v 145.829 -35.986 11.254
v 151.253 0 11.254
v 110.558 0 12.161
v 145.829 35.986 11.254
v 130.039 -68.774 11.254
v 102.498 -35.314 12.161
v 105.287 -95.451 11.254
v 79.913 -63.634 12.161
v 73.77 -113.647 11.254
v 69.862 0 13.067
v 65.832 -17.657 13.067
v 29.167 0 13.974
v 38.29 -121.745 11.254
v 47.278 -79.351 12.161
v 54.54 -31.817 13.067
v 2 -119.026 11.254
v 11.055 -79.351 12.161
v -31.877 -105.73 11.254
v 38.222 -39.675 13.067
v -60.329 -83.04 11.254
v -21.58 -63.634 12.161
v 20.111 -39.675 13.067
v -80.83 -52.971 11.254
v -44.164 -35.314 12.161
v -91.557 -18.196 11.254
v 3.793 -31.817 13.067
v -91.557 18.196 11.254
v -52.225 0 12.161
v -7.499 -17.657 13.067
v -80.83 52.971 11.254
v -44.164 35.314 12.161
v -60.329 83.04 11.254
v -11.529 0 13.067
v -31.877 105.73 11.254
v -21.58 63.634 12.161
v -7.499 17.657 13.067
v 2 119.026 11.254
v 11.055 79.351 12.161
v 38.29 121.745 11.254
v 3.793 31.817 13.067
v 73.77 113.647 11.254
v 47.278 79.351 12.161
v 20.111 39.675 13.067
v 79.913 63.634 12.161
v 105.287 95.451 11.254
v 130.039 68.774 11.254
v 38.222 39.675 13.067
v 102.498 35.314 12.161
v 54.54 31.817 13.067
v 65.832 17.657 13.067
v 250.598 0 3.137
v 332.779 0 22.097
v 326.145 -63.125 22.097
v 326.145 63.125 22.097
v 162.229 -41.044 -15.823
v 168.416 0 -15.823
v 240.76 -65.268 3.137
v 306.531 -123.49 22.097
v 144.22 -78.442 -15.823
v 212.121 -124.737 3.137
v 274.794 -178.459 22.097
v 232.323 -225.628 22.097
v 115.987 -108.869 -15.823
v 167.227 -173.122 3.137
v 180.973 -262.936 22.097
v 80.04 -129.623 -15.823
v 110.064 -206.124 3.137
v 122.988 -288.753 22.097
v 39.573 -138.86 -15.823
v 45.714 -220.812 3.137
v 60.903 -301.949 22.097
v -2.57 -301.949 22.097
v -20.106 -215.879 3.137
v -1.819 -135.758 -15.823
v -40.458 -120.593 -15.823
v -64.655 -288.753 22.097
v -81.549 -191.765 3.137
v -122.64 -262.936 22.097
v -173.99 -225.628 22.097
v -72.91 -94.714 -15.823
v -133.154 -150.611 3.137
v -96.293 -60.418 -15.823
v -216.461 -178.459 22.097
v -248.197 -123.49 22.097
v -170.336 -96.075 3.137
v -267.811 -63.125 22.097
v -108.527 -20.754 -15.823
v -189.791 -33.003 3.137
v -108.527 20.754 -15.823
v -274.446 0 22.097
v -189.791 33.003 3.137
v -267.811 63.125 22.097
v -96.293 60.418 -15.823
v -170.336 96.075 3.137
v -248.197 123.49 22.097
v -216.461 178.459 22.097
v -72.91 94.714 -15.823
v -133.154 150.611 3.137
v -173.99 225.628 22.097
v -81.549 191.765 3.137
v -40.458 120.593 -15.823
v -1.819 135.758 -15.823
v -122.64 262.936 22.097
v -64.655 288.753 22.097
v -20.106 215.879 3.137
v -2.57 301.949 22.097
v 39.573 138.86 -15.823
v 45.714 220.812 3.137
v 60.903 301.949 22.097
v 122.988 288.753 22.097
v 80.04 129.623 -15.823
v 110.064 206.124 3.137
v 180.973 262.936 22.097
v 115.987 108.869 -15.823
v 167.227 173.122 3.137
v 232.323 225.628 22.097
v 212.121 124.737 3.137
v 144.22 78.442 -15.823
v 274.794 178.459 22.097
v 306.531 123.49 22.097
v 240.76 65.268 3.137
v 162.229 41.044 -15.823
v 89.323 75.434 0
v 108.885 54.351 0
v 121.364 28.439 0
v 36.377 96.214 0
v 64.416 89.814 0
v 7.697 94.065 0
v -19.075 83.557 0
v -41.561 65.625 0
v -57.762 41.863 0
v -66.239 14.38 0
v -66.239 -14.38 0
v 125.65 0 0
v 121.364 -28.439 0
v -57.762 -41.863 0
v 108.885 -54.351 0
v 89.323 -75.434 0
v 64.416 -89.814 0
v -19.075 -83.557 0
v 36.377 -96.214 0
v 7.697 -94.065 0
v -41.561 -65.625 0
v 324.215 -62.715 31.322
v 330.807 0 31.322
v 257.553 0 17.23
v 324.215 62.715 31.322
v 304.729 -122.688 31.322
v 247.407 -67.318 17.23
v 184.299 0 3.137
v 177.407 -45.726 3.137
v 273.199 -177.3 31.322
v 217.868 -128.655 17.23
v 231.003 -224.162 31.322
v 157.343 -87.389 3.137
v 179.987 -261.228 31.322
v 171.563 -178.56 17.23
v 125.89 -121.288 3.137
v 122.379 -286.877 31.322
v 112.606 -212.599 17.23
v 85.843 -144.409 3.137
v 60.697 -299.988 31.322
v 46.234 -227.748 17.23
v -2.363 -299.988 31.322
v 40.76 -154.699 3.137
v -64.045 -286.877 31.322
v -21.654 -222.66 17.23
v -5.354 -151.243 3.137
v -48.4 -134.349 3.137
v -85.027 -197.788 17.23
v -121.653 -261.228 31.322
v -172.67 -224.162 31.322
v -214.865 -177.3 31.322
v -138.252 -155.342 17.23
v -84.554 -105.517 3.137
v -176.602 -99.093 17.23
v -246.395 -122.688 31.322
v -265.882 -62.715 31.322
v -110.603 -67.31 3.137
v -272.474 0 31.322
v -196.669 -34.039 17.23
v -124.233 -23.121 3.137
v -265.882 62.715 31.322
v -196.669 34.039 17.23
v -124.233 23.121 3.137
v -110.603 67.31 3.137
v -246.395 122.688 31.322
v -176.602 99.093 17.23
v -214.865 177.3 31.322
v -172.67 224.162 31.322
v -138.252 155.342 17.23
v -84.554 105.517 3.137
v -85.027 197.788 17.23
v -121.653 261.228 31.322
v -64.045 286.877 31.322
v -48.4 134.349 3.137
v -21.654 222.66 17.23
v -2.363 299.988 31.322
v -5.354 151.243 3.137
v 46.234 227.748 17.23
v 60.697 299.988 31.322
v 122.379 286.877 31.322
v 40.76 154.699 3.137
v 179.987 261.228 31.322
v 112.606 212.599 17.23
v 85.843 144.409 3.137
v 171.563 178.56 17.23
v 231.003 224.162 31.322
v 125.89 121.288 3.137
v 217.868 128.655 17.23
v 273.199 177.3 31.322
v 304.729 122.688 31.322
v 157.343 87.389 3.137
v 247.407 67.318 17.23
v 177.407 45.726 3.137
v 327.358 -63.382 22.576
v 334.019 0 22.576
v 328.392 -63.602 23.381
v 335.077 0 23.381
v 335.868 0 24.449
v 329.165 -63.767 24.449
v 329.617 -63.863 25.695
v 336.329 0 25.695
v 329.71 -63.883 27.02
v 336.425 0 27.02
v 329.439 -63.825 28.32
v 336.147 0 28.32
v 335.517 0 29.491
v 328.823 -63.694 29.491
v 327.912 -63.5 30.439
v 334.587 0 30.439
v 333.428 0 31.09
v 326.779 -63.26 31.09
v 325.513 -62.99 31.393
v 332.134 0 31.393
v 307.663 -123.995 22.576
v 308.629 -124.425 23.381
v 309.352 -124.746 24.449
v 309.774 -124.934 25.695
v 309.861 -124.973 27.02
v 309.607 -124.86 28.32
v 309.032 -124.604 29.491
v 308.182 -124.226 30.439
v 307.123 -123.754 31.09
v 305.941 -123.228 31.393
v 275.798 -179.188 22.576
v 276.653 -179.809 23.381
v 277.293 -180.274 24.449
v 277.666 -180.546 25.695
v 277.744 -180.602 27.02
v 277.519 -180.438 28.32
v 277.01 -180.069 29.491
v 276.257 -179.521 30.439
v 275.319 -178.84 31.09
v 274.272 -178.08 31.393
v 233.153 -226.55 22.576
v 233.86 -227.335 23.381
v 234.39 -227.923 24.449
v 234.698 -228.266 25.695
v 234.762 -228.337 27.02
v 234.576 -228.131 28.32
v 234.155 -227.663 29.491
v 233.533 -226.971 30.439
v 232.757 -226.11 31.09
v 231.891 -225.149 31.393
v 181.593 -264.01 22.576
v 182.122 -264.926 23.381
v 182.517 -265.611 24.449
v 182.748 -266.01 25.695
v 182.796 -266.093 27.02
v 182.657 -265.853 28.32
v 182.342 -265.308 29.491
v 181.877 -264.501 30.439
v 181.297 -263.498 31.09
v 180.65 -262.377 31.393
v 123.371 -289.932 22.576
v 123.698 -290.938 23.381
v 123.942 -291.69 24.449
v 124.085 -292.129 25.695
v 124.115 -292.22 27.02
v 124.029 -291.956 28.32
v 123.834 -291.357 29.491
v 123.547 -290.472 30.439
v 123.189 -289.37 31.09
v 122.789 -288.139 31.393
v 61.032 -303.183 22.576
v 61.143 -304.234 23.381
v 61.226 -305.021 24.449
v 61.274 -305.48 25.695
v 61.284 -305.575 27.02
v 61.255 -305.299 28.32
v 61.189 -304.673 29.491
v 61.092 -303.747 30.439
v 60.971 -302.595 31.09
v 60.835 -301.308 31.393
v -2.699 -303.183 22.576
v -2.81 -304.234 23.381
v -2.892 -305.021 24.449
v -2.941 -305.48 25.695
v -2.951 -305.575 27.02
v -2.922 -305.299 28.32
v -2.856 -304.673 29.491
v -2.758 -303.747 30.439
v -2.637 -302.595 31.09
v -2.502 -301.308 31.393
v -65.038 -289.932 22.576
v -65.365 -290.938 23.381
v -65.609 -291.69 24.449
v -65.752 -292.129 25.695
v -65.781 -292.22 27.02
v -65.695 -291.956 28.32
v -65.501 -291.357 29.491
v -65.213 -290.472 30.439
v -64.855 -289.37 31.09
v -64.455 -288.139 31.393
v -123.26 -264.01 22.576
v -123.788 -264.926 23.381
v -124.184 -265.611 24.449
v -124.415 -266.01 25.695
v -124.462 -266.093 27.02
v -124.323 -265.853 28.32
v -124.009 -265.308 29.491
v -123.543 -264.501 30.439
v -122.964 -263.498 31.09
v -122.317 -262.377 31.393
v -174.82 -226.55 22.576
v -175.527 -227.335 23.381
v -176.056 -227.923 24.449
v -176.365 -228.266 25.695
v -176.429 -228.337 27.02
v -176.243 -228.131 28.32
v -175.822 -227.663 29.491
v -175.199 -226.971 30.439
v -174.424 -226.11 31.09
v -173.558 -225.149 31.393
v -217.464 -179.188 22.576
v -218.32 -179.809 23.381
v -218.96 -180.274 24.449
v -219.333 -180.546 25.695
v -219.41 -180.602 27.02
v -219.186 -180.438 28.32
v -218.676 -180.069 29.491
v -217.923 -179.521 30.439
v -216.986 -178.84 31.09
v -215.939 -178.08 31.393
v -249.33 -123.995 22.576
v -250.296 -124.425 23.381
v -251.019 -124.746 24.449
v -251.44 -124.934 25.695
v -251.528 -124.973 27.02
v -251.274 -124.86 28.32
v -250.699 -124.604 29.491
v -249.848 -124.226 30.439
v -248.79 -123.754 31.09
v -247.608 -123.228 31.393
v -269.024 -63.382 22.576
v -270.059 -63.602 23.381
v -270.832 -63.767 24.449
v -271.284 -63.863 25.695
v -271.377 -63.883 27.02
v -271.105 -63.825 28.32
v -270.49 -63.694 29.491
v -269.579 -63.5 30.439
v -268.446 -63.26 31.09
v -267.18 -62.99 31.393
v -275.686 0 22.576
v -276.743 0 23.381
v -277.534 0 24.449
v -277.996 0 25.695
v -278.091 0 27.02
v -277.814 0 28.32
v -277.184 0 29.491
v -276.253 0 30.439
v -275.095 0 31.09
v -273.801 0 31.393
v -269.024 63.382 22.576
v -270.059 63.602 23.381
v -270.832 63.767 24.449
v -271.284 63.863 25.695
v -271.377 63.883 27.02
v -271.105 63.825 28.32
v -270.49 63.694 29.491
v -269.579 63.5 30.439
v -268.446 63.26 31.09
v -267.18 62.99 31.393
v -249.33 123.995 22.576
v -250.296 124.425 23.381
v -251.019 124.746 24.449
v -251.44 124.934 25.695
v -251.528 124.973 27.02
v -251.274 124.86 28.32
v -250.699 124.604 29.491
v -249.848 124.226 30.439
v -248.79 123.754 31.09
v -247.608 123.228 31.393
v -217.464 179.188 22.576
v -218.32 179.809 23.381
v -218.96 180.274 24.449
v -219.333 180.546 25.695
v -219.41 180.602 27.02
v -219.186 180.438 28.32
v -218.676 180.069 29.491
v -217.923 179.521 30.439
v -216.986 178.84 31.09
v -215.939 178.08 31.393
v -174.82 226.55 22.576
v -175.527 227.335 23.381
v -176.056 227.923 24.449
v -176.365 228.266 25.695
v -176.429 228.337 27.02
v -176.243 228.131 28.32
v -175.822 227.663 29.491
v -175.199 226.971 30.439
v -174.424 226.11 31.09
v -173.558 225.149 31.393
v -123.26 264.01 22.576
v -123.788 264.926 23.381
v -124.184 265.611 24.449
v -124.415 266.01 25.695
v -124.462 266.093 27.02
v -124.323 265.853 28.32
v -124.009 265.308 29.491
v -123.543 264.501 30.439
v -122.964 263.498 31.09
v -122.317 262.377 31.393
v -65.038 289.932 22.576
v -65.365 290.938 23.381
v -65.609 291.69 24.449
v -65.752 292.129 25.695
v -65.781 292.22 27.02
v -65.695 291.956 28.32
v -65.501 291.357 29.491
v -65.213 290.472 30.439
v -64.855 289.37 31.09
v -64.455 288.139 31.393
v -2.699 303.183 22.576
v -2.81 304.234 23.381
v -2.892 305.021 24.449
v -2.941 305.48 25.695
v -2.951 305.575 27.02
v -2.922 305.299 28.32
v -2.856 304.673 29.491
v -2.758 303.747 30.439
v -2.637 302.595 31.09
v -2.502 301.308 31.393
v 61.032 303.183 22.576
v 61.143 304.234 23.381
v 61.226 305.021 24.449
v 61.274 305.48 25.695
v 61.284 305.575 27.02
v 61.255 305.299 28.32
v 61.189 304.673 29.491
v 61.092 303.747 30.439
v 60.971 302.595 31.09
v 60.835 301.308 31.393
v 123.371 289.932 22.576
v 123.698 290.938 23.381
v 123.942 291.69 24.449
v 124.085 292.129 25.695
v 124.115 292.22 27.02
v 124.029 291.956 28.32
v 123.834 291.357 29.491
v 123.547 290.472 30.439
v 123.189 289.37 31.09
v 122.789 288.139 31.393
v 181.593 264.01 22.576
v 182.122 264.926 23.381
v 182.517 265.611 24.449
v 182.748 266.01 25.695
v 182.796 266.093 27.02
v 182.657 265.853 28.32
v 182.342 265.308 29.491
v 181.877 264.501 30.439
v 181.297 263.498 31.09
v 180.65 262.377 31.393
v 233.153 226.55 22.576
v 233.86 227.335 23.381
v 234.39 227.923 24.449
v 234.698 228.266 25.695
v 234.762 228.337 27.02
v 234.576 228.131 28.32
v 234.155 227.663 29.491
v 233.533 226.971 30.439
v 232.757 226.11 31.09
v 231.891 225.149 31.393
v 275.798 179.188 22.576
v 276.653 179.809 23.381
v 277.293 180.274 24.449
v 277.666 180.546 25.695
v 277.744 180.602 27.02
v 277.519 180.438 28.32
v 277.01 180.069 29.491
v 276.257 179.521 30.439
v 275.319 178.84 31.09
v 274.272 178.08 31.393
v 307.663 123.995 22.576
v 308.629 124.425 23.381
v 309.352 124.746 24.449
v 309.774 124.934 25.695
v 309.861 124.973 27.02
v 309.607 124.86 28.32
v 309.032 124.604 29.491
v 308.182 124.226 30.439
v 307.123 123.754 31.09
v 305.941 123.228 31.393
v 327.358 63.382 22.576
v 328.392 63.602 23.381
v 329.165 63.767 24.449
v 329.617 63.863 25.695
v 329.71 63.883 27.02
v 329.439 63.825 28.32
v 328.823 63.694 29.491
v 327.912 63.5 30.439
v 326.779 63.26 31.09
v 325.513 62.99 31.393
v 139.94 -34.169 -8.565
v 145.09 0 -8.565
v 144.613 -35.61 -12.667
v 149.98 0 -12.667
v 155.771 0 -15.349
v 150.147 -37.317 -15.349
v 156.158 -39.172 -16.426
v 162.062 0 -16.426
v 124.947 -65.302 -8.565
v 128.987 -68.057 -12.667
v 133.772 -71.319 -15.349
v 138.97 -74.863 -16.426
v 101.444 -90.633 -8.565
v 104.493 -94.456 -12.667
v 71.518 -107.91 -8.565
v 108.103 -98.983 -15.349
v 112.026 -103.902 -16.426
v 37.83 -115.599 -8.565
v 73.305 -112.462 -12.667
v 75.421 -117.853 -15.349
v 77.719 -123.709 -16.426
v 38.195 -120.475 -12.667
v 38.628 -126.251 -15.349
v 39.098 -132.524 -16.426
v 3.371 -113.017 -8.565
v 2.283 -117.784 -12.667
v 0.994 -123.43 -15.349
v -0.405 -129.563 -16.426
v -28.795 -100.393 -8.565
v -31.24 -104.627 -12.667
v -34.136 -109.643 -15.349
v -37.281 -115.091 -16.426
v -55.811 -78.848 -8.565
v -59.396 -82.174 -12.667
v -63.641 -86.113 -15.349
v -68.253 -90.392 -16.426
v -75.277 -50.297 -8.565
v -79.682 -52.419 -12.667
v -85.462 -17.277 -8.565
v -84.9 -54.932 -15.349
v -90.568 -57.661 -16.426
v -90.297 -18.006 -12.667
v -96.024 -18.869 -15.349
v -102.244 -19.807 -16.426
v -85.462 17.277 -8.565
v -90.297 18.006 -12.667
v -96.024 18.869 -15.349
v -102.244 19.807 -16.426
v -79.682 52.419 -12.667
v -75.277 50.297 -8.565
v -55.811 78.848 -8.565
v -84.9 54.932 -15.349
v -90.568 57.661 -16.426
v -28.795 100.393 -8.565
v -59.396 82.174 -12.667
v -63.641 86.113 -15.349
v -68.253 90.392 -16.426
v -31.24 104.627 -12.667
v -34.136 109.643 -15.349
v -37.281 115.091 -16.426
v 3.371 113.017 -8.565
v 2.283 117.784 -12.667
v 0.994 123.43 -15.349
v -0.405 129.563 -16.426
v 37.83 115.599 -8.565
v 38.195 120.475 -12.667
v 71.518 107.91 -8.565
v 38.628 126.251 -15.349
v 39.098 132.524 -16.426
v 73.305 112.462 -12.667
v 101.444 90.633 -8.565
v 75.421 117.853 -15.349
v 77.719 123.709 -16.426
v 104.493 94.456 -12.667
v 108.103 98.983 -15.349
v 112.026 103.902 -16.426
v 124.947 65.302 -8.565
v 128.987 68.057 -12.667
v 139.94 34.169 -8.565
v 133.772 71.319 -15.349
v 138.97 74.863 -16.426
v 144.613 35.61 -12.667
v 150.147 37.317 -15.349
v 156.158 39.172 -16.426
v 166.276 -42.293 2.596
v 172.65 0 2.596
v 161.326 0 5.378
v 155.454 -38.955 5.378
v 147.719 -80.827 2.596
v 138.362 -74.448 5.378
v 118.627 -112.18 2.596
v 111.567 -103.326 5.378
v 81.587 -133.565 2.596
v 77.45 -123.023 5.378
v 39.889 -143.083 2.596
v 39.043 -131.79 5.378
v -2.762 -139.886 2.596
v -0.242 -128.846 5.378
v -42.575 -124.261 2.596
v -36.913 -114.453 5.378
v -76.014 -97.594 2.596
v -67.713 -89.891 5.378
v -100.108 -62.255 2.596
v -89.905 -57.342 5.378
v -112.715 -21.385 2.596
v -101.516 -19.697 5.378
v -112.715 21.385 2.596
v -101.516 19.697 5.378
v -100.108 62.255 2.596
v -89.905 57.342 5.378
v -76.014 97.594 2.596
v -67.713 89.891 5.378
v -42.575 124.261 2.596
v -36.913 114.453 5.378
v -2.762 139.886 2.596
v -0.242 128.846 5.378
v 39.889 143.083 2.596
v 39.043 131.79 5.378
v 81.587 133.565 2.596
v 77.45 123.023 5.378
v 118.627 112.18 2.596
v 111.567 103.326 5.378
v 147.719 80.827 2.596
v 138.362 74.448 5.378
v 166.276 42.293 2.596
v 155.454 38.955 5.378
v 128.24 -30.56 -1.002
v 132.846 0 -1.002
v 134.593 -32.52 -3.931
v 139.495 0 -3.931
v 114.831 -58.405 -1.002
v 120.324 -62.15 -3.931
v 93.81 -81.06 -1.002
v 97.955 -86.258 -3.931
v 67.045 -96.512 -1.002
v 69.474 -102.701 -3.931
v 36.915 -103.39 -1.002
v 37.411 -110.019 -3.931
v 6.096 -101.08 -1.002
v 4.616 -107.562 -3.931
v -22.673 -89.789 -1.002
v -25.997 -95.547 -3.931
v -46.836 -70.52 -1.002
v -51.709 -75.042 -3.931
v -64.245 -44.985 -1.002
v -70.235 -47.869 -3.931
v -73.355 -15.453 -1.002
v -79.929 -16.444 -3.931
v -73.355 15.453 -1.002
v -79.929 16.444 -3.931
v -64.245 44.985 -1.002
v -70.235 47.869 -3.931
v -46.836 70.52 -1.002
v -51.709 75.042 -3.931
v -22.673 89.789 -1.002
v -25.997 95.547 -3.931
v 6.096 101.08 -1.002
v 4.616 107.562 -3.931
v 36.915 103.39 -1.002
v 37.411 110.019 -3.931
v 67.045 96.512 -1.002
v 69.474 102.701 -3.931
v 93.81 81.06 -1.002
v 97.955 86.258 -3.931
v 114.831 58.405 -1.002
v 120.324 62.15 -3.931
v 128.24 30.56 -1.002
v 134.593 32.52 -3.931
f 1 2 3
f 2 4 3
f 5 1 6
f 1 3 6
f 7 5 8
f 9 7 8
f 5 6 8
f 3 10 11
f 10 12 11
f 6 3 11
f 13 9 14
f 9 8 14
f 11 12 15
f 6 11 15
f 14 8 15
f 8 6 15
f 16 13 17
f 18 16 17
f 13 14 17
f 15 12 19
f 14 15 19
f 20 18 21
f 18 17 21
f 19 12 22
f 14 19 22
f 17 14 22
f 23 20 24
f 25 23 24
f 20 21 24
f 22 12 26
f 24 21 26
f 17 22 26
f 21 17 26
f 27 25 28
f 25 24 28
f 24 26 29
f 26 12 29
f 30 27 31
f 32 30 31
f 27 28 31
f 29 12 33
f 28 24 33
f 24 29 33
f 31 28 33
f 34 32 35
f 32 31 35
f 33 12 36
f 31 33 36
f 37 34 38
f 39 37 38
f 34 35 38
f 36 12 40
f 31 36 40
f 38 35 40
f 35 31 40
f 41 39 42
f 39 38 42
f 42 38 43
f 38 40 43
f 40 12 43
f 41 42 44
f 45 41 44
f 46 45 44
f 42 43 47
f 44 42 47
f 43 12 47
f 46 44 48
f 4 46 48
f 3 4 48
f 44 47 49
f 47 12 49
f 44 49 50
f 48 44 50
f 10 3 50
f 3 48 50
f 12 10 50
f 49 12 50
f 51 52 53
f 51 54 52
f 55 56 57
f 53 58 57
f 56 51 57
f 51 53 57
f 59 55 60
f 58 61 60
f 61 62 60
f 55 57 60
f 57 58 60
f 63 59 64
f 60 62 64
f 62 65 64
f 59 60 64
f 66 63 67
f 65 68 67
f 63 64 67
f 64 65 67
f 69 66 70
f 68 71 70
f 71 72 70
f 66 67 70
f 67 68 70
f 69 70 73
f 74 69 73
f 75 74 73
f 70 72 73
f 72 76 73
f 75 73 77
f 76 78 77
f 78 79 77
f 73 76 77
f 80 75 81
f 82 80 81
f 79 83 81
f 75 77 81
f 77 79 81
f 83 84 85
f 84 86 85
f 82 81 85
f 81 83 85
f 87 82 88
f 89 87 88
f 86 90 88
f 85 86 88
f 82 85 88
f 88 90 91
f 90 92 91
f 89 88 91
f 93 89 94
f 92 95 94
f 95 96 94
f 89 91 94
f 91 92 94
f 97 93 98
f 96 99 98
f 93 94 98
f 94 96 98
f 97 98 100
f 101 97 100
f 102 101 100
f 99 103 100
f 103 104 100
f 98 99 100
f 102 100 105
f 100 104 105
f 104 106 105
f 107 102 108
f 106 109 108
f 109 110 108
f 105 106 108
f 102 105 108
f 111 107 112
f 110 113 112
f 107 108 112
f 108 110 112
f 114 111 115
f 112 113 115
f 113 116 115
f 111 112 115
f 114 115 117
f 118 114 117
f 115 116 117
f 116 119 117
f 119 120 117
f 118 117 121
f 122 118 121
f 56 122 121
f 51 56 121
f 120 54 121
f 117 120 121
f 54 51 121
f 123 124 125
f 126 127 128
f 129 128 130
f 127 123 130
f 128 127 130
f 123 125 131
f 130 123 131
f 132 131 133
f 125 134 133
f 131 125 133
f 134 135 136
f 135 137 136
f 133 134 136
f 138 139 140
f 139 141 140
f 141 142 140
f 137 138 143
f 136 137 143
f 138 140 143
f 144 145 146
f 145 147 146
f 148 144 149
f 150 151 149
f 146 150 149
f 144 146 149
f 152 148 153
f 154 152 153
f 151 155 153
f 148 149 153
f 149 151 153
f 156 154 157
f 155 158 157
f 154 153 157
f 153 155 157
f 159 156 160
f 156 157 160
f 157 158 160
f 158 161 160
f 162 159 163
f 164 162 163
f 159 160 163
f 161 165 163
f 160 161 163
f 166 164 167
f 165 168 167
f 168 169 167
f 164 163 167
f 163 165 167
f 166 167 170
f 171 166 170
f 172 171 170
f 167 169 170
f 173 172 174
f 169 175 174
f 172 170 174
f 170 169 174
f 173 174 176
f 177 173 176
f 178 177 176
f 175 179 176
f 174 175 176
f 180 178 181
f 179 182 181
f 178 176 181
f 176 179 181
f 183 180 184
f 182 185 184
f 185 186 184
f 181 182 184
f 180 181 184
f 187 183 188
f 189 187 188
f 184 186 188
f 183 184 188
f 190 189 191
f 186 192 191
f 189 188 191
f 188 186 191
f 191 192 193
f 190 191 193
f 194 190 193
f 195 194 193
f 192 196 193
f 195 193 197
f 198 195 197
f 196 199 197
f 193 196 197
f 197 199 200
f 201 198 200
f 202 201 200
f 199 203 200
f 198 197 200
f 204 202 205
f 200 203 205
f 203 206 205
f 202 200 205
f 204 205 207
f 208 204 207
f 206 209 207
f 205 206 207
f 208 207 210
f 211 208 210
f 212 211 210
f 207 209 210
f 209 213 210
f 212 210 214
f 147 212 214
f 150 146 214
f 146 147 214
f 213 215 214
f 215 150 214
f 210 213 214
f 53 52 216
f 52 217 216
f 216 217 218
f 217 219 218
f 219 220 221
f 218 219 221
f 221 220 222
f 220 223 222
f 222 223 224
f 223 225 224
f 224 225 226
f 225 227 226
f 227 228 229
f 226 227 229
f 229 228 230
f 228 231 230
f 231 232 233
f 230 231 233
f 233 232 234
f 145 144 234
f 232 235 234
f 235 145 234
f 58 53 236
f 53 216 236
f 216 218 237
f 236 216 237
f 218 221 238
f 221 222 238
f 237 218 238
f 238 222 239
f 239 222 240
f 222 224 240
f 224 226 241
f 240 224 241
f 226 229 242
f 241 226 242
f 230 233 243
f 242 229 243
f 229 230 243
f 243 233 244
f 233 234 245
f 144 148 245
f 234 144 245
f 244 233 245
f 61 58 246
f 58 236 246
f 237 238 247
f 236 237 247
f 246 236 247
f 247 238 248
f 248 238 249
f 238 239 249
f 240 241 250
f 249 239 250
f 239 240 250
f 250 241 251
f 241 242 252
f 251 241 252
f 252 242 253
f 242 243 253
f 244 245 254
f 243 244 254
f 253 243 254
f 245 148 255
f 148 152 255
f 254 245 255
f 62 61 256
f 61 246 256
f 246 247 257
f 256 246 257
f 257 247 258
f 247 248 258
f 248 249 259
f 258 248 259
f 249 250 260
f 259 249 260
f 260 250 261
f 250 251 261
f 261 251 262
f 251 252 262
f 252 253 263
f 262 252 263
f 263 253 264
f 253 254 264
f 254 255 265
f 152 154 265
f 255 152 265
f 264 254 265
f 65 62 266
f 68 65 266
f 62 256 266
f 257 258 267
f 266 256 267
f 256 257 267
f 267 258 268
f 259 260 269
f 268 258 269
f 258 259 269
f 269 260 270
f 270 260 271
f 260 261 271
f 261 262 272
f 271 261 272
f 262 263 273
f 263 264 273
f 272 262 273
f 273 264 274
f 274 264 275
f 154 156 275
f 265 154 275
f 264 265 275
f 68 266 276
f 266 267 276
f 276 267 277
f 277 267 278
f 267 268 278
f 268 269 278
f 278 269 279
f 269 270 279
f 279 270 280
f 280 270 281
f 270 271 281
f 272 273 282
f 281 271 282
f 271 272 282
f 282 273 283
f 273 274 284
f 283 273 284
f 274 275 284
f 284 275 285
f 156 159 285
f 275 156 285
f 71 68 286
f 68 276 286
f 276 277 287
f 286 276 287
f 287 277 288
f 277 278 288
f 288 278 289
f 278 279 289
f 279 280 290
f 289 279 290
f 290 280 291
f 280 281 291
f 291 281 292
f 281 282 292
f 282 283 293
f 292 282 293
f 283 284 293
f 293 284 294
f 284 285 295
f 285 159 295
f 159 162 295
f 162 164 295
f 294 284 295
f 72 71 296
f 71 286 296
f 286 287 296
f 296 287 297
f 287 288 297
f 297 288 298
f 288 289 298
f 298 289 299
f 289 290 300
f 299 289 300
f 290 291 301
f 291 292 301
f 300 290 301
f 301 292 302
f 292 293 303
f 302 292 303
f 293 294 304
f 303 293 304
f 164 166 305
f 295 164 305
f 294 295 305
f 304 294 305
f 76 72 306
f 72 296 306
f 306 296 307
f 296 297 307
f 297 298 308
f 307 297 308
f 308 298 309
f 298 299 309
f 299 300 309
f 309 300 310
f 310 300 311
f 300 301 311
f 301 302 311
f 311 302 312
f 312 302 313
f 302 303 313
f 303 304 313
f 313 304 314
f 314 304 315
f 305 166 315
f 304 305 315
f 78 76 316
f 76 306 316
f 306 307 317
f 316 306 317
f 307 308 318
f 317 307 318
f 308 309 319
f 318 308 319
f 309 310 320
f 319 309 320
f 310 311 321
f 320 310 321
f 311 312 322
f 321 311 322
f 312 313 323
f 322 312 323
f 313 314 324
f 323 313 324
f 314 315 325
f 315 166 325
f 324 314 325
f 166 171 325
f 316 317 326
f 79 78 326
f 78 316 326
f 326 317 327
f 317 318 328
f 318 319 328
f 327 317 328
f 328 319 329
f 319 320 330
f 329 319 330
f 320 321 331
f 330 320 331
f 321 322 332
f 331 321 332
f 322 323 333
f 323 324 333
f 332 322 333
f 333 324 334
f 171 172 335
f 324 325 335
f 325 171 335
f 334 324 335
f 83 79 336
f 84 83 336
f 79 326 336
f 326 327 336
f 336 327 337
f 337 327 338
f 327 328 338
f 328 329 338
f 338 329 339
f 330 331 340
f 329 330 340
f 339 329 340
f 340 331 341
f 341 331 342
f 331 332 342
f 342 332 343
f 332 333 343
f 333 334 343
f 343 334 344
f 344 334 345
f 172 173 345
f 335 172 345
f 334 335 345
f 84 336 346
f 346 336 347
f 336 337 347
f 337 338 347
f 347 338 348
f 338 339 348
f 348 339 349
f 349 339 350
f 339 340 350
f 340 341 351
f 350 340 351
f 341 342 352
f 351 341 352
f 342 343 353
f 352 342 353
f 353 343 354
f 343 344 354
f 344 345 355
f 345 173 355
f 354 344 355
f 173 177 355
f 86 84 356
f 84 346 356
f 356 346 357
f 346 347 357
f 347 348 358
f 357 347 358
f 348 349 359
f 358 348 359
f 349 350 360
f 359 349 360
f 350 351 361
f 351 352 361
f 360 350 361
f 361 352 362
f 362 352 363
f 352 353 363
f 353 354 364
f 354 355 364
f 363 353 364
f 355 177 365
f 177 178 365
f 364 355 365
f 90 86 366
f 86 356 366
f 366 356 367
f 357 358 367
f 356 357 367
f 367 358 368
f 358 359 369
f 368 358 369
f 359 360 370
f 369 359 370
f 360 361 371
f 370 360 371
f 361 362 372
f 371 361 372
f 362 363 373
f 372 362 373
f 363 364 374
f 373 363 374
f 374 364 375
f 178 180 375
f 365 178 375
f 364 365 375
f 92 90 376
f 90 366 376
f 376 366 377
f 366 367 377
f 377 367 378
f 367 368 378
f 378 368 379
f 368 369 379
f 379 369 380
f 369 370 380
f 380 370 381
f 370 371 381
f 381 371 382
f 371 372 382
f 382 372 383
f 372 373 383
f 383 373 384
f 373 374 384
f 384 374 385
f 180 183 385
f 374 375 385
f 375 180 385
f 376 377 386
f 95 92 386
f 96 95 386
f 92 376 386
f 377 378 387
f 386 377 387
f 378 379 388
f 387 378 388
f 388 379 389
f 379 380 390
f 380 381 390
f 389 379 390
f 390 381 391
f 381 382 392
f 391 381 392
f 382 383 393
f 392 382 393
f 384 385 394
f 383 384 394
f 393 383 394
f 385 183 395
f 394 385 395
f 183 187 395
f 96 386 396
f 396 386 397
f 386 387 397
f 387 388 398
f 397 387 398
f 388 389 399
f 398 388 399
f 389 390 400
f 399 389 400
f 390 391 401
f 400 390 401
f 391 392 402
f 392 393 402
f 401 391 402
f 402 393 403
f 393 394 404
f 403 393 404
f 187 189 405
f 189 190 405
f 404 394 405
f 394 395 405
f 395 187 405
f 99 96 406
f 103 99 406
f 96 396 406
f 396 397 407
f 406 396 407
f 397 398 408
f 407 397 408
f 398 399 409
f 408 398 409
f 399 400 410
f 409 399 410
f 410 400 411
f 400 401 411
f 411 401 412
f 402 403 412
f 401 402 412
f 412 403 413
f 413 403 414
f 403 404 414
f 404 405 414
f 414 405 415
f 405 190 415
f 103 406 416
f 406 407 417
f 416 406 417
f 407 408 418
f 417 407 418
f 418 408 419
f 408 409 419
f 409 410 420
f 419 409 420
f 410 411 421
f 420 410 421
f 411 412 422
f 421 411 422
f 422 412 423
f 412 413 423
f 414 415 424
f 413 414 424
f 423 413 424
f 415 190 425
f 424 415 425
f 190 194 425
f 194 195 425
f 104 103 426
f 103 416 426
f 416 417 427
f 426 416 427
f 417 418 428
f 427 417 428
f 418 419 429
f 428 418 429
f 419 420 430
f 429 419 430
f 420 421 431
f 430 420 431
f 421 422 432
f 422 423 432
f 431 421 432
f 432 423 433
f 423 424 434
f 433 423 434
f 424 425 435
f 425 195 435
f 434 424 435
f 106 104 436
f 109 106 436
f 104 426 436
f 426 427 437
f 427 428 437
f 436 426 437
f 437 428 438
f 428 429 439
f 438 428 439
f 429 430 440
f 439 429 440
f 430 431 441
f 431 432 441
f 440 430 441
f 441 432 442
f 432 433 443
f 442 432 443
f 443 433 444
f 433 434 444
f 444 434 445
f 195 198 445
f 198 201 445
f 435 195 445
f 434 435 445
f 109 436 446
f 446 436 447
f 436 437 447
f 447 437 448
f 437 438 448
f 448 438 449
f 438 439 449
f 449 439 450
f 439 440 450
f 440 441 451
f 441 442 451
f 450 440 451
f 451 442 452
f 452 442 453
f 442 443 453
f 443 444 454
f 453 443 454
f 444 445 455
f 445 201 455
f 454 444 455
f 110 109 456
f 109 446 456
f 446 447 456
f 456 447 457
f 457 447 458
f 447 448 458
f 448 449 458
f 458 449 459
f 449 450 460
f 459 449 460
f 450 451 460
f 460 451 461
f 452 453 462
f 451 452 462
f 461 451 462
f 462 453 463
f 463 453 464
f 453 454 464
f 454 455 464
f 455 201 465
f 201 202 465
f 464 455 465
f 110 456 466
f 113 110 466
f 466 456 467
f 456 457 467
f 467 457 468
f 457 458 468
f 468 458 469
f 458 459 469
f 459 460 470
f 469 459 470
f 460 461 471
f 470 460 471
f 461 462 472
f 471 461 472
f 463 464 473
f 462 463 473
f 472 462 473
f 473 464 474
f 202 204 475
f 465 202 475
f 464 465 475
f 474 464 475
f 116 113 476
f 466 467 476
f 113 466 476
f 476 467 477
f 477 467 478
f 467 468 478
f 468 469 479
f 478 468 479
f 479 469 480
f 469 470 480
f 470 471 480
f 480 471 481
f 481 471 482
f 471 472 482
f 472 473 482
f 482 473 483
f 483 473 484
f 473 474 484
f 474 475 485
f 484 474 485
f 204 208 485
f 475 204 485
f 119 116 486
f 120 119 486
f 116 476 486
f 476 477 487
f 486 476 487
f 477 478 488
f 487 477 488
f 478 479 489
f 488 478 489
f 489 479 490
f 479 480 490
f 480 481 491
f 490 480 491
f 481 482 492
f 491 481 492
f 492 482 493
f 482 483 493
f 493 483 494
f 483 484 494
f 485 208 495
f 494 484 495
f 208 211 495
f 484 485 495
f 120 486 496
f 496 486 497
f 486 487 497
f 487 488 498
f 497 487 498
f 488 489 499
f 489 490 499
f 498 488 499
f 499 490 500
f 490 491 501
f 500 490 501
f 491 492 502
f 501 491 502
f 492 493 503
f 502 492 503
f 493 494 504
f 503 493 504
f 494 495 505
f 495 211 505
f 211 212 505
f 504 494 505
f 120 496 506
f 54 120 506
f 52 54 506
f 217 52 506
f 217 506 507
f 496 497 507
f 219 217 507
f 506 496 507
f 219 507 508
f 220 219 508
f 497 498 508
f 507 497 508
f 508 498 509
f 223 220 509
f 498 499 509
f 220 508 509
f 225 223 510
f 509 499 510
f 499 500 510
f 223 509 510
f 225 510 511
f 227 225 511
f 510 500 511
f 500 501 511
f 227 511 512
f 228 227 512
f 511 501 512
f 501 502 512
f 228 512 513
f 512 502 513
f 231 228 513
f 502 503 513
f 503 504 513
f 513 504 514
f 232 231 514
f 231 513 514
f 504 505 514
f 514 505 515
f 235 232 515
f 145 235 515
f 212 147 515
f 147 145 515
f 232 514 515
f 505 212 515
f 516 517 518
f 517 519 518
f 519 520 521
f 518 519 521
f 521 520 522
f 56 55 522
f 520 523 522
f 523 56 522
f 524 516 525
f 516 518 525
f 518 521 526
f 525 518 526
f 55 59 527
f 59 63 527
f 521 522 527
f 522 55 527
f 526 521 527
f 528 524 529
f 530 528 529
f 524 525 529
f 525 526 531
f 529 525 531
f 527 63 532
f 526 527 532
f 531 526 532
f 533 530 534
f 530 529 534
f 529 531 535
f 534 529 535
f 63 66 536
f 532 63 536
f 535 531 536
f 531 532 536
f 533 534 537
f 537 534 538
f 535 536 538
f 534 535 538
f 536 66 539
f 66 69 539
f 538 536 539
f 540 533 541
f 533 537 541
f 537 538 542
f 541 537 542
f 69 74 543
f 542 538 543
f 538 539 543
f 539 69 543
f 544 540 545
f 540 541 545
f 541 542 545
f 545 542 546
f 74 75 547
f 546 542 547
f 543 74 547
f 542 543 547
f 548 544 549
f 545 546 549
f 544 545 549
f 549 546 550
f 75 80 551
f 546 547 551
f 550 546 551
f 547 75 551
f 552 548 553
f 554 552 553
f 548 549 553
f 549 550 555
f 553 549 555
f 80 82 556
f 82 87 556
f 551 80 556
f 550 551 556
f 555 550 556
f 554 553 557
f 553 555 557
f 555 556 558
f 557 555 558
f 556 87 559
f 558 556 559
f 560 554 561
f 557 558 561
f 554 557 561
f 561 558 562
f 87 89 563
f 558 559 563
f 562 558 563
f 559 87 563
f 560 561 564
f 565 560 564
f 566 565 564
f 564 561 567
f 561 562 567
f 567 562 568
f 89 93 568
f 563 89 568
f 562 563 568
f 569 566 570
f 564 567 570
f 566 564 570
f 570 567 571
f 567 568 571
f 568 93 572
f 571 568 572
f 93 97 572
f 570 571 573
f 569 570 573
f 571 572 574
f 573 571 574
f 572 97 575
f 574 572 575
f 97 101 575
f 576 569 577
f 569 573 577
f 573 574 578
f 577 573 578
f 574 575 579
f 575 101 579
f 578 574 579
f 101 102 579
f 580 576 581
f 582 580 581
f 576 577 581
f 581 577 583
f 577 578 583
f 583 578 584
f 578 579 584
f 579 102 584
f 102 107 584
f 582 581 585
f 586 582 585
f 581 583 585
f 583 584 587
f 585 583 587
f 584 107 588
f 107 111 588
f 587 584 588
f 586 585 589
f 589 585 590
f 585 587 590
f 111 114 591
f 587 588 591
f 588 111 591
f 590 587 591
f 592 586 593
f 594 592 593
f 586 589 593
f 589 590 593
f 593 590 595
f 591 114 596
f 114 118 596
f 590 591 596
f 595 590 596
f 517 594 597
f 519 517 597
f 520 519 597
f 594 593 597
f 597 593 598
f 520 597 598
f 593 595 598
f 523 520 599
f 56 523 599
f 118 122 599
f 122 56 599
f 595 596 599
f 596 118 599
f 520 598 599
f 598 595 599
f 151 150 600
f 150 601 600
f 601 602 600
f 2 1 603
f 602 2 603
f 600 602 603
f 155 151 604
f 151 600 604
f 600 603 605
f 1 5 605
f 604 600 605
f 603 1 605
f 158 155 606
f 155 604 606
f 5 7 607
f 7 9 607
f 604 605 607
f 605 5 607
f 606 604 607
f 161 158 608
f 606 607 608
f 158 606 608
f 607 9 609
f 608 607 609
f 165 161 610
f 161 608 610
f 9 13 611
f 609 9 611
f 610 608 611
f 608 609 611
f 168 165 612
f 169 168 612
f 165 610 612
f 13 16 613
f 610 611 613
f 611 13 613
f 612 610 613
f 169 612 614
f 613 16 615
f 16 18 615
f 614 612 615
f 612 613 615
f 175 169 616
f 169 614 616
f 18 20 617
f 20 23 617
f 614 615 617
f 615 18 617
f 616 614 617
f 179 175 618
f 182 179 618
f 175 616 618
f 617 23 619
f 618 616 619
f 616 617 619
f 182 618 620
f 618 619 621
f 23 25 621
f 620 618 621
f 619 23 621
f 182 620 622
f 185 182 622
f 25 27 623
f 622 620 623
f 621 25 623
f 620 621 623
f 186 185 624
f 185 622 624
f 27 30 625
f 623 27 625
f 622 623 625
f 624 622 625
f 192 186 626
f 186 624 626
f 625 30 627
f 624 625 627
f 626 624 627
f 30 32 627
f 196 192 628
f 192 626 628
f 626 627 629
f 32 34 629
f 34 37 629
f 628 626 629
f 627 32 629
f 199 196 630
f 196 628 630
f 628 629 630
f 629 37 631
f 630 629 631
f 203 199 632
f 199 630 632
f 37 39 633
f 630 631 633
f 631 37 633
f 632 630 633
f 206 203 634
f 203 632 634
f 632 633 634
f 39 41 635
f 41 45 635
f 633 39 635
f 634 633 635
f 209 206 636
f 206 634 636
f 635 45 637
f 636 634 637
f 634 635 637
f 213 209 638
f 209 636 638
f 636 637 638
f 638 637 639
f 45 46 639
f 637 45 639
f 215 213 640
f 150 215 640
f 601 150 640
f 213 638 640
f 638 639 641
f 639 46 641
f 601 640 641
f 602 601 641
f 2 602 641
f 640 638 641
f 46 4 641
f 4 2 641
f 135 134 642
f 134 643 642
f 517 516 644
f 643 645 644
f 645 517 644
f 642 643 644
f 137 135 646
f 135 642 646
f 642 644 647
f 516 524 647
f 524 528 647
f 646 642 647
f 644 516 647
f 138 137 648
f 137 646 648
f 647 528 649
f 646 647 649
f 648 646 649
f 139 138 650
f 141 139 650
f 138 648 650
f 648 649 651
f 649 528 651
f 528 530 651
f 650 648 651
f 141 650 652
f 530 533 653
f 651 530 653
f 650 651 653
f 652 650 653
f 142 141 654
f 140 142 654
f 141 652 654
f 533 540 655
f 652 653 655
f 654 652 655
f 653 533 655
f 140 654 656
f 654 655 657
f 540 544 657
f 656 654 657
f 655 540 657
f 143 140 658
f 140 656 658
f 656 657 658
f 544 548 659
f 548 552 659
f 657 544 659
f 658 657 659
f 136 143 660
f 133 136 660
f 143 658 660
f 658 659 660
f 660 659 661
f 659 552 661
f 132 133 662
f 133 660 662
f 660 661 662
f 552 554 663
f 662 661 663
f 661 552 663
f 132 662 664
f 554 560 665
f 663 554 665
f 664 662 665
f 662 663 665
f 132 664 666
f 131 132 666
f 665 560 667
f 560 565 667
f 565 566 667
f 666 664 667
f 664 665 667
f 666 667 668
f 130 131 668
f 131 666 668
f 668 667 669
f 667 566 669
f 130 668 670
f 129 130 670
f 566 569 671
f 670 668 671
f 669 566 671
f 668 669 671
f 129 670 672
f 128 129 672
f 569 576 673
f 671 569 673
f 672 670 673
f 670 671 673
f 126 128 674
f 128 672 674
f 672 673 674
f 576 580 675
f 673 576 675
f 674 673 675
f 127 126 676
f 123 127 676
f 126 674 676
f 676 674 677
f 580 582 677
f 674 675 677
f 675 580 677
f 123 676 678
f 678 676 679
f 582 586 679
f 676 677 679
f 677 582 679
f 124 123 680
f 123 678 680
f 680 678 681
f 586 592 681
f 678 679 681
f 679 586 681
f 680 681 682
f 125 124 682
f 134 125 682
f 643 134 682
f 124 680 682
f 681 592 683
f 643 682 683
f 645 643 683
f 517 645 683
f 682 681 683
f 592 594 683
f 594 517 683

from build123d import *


with BuildPart() as f1:
    # F0 (on Front) → F1 (revolve)
    with BuildSketch(Plane.XZ):
        with BuildLine():
            Line((151.253424, 11.254308), (29.166639, 13.973743))
            Line((29.166639, 13.973743), (29.166639, 0))
            Line((29.166639, 0), (125.650197, 0))
            ThreePointArc((125.650197, 0), (136.271784, -2.236273), (145.090006, -8.565411))
            ThreePointArc((145.090006, -8.565411), (155.771268, -15.34929), (168.415868, -15.82308))
            Line((168.415868, -15.82308), (332.77935, 22.097347))
            ThreePointArc((332.77935, 22.097347), (336.331788, 27.680104), (330.806913, 31.321911))
            Line((330.806913, 31.321911), (184.299229, 3.137134))
            ThreePointArc((184.299229, 3.137134), (166.888073, 3.579557), (151.253424, 11.254308))
        make_face()
    revolve(axis=Axis((29.166639, 0, 0.612669), (0, 0, -1)))


solid = f1.part
